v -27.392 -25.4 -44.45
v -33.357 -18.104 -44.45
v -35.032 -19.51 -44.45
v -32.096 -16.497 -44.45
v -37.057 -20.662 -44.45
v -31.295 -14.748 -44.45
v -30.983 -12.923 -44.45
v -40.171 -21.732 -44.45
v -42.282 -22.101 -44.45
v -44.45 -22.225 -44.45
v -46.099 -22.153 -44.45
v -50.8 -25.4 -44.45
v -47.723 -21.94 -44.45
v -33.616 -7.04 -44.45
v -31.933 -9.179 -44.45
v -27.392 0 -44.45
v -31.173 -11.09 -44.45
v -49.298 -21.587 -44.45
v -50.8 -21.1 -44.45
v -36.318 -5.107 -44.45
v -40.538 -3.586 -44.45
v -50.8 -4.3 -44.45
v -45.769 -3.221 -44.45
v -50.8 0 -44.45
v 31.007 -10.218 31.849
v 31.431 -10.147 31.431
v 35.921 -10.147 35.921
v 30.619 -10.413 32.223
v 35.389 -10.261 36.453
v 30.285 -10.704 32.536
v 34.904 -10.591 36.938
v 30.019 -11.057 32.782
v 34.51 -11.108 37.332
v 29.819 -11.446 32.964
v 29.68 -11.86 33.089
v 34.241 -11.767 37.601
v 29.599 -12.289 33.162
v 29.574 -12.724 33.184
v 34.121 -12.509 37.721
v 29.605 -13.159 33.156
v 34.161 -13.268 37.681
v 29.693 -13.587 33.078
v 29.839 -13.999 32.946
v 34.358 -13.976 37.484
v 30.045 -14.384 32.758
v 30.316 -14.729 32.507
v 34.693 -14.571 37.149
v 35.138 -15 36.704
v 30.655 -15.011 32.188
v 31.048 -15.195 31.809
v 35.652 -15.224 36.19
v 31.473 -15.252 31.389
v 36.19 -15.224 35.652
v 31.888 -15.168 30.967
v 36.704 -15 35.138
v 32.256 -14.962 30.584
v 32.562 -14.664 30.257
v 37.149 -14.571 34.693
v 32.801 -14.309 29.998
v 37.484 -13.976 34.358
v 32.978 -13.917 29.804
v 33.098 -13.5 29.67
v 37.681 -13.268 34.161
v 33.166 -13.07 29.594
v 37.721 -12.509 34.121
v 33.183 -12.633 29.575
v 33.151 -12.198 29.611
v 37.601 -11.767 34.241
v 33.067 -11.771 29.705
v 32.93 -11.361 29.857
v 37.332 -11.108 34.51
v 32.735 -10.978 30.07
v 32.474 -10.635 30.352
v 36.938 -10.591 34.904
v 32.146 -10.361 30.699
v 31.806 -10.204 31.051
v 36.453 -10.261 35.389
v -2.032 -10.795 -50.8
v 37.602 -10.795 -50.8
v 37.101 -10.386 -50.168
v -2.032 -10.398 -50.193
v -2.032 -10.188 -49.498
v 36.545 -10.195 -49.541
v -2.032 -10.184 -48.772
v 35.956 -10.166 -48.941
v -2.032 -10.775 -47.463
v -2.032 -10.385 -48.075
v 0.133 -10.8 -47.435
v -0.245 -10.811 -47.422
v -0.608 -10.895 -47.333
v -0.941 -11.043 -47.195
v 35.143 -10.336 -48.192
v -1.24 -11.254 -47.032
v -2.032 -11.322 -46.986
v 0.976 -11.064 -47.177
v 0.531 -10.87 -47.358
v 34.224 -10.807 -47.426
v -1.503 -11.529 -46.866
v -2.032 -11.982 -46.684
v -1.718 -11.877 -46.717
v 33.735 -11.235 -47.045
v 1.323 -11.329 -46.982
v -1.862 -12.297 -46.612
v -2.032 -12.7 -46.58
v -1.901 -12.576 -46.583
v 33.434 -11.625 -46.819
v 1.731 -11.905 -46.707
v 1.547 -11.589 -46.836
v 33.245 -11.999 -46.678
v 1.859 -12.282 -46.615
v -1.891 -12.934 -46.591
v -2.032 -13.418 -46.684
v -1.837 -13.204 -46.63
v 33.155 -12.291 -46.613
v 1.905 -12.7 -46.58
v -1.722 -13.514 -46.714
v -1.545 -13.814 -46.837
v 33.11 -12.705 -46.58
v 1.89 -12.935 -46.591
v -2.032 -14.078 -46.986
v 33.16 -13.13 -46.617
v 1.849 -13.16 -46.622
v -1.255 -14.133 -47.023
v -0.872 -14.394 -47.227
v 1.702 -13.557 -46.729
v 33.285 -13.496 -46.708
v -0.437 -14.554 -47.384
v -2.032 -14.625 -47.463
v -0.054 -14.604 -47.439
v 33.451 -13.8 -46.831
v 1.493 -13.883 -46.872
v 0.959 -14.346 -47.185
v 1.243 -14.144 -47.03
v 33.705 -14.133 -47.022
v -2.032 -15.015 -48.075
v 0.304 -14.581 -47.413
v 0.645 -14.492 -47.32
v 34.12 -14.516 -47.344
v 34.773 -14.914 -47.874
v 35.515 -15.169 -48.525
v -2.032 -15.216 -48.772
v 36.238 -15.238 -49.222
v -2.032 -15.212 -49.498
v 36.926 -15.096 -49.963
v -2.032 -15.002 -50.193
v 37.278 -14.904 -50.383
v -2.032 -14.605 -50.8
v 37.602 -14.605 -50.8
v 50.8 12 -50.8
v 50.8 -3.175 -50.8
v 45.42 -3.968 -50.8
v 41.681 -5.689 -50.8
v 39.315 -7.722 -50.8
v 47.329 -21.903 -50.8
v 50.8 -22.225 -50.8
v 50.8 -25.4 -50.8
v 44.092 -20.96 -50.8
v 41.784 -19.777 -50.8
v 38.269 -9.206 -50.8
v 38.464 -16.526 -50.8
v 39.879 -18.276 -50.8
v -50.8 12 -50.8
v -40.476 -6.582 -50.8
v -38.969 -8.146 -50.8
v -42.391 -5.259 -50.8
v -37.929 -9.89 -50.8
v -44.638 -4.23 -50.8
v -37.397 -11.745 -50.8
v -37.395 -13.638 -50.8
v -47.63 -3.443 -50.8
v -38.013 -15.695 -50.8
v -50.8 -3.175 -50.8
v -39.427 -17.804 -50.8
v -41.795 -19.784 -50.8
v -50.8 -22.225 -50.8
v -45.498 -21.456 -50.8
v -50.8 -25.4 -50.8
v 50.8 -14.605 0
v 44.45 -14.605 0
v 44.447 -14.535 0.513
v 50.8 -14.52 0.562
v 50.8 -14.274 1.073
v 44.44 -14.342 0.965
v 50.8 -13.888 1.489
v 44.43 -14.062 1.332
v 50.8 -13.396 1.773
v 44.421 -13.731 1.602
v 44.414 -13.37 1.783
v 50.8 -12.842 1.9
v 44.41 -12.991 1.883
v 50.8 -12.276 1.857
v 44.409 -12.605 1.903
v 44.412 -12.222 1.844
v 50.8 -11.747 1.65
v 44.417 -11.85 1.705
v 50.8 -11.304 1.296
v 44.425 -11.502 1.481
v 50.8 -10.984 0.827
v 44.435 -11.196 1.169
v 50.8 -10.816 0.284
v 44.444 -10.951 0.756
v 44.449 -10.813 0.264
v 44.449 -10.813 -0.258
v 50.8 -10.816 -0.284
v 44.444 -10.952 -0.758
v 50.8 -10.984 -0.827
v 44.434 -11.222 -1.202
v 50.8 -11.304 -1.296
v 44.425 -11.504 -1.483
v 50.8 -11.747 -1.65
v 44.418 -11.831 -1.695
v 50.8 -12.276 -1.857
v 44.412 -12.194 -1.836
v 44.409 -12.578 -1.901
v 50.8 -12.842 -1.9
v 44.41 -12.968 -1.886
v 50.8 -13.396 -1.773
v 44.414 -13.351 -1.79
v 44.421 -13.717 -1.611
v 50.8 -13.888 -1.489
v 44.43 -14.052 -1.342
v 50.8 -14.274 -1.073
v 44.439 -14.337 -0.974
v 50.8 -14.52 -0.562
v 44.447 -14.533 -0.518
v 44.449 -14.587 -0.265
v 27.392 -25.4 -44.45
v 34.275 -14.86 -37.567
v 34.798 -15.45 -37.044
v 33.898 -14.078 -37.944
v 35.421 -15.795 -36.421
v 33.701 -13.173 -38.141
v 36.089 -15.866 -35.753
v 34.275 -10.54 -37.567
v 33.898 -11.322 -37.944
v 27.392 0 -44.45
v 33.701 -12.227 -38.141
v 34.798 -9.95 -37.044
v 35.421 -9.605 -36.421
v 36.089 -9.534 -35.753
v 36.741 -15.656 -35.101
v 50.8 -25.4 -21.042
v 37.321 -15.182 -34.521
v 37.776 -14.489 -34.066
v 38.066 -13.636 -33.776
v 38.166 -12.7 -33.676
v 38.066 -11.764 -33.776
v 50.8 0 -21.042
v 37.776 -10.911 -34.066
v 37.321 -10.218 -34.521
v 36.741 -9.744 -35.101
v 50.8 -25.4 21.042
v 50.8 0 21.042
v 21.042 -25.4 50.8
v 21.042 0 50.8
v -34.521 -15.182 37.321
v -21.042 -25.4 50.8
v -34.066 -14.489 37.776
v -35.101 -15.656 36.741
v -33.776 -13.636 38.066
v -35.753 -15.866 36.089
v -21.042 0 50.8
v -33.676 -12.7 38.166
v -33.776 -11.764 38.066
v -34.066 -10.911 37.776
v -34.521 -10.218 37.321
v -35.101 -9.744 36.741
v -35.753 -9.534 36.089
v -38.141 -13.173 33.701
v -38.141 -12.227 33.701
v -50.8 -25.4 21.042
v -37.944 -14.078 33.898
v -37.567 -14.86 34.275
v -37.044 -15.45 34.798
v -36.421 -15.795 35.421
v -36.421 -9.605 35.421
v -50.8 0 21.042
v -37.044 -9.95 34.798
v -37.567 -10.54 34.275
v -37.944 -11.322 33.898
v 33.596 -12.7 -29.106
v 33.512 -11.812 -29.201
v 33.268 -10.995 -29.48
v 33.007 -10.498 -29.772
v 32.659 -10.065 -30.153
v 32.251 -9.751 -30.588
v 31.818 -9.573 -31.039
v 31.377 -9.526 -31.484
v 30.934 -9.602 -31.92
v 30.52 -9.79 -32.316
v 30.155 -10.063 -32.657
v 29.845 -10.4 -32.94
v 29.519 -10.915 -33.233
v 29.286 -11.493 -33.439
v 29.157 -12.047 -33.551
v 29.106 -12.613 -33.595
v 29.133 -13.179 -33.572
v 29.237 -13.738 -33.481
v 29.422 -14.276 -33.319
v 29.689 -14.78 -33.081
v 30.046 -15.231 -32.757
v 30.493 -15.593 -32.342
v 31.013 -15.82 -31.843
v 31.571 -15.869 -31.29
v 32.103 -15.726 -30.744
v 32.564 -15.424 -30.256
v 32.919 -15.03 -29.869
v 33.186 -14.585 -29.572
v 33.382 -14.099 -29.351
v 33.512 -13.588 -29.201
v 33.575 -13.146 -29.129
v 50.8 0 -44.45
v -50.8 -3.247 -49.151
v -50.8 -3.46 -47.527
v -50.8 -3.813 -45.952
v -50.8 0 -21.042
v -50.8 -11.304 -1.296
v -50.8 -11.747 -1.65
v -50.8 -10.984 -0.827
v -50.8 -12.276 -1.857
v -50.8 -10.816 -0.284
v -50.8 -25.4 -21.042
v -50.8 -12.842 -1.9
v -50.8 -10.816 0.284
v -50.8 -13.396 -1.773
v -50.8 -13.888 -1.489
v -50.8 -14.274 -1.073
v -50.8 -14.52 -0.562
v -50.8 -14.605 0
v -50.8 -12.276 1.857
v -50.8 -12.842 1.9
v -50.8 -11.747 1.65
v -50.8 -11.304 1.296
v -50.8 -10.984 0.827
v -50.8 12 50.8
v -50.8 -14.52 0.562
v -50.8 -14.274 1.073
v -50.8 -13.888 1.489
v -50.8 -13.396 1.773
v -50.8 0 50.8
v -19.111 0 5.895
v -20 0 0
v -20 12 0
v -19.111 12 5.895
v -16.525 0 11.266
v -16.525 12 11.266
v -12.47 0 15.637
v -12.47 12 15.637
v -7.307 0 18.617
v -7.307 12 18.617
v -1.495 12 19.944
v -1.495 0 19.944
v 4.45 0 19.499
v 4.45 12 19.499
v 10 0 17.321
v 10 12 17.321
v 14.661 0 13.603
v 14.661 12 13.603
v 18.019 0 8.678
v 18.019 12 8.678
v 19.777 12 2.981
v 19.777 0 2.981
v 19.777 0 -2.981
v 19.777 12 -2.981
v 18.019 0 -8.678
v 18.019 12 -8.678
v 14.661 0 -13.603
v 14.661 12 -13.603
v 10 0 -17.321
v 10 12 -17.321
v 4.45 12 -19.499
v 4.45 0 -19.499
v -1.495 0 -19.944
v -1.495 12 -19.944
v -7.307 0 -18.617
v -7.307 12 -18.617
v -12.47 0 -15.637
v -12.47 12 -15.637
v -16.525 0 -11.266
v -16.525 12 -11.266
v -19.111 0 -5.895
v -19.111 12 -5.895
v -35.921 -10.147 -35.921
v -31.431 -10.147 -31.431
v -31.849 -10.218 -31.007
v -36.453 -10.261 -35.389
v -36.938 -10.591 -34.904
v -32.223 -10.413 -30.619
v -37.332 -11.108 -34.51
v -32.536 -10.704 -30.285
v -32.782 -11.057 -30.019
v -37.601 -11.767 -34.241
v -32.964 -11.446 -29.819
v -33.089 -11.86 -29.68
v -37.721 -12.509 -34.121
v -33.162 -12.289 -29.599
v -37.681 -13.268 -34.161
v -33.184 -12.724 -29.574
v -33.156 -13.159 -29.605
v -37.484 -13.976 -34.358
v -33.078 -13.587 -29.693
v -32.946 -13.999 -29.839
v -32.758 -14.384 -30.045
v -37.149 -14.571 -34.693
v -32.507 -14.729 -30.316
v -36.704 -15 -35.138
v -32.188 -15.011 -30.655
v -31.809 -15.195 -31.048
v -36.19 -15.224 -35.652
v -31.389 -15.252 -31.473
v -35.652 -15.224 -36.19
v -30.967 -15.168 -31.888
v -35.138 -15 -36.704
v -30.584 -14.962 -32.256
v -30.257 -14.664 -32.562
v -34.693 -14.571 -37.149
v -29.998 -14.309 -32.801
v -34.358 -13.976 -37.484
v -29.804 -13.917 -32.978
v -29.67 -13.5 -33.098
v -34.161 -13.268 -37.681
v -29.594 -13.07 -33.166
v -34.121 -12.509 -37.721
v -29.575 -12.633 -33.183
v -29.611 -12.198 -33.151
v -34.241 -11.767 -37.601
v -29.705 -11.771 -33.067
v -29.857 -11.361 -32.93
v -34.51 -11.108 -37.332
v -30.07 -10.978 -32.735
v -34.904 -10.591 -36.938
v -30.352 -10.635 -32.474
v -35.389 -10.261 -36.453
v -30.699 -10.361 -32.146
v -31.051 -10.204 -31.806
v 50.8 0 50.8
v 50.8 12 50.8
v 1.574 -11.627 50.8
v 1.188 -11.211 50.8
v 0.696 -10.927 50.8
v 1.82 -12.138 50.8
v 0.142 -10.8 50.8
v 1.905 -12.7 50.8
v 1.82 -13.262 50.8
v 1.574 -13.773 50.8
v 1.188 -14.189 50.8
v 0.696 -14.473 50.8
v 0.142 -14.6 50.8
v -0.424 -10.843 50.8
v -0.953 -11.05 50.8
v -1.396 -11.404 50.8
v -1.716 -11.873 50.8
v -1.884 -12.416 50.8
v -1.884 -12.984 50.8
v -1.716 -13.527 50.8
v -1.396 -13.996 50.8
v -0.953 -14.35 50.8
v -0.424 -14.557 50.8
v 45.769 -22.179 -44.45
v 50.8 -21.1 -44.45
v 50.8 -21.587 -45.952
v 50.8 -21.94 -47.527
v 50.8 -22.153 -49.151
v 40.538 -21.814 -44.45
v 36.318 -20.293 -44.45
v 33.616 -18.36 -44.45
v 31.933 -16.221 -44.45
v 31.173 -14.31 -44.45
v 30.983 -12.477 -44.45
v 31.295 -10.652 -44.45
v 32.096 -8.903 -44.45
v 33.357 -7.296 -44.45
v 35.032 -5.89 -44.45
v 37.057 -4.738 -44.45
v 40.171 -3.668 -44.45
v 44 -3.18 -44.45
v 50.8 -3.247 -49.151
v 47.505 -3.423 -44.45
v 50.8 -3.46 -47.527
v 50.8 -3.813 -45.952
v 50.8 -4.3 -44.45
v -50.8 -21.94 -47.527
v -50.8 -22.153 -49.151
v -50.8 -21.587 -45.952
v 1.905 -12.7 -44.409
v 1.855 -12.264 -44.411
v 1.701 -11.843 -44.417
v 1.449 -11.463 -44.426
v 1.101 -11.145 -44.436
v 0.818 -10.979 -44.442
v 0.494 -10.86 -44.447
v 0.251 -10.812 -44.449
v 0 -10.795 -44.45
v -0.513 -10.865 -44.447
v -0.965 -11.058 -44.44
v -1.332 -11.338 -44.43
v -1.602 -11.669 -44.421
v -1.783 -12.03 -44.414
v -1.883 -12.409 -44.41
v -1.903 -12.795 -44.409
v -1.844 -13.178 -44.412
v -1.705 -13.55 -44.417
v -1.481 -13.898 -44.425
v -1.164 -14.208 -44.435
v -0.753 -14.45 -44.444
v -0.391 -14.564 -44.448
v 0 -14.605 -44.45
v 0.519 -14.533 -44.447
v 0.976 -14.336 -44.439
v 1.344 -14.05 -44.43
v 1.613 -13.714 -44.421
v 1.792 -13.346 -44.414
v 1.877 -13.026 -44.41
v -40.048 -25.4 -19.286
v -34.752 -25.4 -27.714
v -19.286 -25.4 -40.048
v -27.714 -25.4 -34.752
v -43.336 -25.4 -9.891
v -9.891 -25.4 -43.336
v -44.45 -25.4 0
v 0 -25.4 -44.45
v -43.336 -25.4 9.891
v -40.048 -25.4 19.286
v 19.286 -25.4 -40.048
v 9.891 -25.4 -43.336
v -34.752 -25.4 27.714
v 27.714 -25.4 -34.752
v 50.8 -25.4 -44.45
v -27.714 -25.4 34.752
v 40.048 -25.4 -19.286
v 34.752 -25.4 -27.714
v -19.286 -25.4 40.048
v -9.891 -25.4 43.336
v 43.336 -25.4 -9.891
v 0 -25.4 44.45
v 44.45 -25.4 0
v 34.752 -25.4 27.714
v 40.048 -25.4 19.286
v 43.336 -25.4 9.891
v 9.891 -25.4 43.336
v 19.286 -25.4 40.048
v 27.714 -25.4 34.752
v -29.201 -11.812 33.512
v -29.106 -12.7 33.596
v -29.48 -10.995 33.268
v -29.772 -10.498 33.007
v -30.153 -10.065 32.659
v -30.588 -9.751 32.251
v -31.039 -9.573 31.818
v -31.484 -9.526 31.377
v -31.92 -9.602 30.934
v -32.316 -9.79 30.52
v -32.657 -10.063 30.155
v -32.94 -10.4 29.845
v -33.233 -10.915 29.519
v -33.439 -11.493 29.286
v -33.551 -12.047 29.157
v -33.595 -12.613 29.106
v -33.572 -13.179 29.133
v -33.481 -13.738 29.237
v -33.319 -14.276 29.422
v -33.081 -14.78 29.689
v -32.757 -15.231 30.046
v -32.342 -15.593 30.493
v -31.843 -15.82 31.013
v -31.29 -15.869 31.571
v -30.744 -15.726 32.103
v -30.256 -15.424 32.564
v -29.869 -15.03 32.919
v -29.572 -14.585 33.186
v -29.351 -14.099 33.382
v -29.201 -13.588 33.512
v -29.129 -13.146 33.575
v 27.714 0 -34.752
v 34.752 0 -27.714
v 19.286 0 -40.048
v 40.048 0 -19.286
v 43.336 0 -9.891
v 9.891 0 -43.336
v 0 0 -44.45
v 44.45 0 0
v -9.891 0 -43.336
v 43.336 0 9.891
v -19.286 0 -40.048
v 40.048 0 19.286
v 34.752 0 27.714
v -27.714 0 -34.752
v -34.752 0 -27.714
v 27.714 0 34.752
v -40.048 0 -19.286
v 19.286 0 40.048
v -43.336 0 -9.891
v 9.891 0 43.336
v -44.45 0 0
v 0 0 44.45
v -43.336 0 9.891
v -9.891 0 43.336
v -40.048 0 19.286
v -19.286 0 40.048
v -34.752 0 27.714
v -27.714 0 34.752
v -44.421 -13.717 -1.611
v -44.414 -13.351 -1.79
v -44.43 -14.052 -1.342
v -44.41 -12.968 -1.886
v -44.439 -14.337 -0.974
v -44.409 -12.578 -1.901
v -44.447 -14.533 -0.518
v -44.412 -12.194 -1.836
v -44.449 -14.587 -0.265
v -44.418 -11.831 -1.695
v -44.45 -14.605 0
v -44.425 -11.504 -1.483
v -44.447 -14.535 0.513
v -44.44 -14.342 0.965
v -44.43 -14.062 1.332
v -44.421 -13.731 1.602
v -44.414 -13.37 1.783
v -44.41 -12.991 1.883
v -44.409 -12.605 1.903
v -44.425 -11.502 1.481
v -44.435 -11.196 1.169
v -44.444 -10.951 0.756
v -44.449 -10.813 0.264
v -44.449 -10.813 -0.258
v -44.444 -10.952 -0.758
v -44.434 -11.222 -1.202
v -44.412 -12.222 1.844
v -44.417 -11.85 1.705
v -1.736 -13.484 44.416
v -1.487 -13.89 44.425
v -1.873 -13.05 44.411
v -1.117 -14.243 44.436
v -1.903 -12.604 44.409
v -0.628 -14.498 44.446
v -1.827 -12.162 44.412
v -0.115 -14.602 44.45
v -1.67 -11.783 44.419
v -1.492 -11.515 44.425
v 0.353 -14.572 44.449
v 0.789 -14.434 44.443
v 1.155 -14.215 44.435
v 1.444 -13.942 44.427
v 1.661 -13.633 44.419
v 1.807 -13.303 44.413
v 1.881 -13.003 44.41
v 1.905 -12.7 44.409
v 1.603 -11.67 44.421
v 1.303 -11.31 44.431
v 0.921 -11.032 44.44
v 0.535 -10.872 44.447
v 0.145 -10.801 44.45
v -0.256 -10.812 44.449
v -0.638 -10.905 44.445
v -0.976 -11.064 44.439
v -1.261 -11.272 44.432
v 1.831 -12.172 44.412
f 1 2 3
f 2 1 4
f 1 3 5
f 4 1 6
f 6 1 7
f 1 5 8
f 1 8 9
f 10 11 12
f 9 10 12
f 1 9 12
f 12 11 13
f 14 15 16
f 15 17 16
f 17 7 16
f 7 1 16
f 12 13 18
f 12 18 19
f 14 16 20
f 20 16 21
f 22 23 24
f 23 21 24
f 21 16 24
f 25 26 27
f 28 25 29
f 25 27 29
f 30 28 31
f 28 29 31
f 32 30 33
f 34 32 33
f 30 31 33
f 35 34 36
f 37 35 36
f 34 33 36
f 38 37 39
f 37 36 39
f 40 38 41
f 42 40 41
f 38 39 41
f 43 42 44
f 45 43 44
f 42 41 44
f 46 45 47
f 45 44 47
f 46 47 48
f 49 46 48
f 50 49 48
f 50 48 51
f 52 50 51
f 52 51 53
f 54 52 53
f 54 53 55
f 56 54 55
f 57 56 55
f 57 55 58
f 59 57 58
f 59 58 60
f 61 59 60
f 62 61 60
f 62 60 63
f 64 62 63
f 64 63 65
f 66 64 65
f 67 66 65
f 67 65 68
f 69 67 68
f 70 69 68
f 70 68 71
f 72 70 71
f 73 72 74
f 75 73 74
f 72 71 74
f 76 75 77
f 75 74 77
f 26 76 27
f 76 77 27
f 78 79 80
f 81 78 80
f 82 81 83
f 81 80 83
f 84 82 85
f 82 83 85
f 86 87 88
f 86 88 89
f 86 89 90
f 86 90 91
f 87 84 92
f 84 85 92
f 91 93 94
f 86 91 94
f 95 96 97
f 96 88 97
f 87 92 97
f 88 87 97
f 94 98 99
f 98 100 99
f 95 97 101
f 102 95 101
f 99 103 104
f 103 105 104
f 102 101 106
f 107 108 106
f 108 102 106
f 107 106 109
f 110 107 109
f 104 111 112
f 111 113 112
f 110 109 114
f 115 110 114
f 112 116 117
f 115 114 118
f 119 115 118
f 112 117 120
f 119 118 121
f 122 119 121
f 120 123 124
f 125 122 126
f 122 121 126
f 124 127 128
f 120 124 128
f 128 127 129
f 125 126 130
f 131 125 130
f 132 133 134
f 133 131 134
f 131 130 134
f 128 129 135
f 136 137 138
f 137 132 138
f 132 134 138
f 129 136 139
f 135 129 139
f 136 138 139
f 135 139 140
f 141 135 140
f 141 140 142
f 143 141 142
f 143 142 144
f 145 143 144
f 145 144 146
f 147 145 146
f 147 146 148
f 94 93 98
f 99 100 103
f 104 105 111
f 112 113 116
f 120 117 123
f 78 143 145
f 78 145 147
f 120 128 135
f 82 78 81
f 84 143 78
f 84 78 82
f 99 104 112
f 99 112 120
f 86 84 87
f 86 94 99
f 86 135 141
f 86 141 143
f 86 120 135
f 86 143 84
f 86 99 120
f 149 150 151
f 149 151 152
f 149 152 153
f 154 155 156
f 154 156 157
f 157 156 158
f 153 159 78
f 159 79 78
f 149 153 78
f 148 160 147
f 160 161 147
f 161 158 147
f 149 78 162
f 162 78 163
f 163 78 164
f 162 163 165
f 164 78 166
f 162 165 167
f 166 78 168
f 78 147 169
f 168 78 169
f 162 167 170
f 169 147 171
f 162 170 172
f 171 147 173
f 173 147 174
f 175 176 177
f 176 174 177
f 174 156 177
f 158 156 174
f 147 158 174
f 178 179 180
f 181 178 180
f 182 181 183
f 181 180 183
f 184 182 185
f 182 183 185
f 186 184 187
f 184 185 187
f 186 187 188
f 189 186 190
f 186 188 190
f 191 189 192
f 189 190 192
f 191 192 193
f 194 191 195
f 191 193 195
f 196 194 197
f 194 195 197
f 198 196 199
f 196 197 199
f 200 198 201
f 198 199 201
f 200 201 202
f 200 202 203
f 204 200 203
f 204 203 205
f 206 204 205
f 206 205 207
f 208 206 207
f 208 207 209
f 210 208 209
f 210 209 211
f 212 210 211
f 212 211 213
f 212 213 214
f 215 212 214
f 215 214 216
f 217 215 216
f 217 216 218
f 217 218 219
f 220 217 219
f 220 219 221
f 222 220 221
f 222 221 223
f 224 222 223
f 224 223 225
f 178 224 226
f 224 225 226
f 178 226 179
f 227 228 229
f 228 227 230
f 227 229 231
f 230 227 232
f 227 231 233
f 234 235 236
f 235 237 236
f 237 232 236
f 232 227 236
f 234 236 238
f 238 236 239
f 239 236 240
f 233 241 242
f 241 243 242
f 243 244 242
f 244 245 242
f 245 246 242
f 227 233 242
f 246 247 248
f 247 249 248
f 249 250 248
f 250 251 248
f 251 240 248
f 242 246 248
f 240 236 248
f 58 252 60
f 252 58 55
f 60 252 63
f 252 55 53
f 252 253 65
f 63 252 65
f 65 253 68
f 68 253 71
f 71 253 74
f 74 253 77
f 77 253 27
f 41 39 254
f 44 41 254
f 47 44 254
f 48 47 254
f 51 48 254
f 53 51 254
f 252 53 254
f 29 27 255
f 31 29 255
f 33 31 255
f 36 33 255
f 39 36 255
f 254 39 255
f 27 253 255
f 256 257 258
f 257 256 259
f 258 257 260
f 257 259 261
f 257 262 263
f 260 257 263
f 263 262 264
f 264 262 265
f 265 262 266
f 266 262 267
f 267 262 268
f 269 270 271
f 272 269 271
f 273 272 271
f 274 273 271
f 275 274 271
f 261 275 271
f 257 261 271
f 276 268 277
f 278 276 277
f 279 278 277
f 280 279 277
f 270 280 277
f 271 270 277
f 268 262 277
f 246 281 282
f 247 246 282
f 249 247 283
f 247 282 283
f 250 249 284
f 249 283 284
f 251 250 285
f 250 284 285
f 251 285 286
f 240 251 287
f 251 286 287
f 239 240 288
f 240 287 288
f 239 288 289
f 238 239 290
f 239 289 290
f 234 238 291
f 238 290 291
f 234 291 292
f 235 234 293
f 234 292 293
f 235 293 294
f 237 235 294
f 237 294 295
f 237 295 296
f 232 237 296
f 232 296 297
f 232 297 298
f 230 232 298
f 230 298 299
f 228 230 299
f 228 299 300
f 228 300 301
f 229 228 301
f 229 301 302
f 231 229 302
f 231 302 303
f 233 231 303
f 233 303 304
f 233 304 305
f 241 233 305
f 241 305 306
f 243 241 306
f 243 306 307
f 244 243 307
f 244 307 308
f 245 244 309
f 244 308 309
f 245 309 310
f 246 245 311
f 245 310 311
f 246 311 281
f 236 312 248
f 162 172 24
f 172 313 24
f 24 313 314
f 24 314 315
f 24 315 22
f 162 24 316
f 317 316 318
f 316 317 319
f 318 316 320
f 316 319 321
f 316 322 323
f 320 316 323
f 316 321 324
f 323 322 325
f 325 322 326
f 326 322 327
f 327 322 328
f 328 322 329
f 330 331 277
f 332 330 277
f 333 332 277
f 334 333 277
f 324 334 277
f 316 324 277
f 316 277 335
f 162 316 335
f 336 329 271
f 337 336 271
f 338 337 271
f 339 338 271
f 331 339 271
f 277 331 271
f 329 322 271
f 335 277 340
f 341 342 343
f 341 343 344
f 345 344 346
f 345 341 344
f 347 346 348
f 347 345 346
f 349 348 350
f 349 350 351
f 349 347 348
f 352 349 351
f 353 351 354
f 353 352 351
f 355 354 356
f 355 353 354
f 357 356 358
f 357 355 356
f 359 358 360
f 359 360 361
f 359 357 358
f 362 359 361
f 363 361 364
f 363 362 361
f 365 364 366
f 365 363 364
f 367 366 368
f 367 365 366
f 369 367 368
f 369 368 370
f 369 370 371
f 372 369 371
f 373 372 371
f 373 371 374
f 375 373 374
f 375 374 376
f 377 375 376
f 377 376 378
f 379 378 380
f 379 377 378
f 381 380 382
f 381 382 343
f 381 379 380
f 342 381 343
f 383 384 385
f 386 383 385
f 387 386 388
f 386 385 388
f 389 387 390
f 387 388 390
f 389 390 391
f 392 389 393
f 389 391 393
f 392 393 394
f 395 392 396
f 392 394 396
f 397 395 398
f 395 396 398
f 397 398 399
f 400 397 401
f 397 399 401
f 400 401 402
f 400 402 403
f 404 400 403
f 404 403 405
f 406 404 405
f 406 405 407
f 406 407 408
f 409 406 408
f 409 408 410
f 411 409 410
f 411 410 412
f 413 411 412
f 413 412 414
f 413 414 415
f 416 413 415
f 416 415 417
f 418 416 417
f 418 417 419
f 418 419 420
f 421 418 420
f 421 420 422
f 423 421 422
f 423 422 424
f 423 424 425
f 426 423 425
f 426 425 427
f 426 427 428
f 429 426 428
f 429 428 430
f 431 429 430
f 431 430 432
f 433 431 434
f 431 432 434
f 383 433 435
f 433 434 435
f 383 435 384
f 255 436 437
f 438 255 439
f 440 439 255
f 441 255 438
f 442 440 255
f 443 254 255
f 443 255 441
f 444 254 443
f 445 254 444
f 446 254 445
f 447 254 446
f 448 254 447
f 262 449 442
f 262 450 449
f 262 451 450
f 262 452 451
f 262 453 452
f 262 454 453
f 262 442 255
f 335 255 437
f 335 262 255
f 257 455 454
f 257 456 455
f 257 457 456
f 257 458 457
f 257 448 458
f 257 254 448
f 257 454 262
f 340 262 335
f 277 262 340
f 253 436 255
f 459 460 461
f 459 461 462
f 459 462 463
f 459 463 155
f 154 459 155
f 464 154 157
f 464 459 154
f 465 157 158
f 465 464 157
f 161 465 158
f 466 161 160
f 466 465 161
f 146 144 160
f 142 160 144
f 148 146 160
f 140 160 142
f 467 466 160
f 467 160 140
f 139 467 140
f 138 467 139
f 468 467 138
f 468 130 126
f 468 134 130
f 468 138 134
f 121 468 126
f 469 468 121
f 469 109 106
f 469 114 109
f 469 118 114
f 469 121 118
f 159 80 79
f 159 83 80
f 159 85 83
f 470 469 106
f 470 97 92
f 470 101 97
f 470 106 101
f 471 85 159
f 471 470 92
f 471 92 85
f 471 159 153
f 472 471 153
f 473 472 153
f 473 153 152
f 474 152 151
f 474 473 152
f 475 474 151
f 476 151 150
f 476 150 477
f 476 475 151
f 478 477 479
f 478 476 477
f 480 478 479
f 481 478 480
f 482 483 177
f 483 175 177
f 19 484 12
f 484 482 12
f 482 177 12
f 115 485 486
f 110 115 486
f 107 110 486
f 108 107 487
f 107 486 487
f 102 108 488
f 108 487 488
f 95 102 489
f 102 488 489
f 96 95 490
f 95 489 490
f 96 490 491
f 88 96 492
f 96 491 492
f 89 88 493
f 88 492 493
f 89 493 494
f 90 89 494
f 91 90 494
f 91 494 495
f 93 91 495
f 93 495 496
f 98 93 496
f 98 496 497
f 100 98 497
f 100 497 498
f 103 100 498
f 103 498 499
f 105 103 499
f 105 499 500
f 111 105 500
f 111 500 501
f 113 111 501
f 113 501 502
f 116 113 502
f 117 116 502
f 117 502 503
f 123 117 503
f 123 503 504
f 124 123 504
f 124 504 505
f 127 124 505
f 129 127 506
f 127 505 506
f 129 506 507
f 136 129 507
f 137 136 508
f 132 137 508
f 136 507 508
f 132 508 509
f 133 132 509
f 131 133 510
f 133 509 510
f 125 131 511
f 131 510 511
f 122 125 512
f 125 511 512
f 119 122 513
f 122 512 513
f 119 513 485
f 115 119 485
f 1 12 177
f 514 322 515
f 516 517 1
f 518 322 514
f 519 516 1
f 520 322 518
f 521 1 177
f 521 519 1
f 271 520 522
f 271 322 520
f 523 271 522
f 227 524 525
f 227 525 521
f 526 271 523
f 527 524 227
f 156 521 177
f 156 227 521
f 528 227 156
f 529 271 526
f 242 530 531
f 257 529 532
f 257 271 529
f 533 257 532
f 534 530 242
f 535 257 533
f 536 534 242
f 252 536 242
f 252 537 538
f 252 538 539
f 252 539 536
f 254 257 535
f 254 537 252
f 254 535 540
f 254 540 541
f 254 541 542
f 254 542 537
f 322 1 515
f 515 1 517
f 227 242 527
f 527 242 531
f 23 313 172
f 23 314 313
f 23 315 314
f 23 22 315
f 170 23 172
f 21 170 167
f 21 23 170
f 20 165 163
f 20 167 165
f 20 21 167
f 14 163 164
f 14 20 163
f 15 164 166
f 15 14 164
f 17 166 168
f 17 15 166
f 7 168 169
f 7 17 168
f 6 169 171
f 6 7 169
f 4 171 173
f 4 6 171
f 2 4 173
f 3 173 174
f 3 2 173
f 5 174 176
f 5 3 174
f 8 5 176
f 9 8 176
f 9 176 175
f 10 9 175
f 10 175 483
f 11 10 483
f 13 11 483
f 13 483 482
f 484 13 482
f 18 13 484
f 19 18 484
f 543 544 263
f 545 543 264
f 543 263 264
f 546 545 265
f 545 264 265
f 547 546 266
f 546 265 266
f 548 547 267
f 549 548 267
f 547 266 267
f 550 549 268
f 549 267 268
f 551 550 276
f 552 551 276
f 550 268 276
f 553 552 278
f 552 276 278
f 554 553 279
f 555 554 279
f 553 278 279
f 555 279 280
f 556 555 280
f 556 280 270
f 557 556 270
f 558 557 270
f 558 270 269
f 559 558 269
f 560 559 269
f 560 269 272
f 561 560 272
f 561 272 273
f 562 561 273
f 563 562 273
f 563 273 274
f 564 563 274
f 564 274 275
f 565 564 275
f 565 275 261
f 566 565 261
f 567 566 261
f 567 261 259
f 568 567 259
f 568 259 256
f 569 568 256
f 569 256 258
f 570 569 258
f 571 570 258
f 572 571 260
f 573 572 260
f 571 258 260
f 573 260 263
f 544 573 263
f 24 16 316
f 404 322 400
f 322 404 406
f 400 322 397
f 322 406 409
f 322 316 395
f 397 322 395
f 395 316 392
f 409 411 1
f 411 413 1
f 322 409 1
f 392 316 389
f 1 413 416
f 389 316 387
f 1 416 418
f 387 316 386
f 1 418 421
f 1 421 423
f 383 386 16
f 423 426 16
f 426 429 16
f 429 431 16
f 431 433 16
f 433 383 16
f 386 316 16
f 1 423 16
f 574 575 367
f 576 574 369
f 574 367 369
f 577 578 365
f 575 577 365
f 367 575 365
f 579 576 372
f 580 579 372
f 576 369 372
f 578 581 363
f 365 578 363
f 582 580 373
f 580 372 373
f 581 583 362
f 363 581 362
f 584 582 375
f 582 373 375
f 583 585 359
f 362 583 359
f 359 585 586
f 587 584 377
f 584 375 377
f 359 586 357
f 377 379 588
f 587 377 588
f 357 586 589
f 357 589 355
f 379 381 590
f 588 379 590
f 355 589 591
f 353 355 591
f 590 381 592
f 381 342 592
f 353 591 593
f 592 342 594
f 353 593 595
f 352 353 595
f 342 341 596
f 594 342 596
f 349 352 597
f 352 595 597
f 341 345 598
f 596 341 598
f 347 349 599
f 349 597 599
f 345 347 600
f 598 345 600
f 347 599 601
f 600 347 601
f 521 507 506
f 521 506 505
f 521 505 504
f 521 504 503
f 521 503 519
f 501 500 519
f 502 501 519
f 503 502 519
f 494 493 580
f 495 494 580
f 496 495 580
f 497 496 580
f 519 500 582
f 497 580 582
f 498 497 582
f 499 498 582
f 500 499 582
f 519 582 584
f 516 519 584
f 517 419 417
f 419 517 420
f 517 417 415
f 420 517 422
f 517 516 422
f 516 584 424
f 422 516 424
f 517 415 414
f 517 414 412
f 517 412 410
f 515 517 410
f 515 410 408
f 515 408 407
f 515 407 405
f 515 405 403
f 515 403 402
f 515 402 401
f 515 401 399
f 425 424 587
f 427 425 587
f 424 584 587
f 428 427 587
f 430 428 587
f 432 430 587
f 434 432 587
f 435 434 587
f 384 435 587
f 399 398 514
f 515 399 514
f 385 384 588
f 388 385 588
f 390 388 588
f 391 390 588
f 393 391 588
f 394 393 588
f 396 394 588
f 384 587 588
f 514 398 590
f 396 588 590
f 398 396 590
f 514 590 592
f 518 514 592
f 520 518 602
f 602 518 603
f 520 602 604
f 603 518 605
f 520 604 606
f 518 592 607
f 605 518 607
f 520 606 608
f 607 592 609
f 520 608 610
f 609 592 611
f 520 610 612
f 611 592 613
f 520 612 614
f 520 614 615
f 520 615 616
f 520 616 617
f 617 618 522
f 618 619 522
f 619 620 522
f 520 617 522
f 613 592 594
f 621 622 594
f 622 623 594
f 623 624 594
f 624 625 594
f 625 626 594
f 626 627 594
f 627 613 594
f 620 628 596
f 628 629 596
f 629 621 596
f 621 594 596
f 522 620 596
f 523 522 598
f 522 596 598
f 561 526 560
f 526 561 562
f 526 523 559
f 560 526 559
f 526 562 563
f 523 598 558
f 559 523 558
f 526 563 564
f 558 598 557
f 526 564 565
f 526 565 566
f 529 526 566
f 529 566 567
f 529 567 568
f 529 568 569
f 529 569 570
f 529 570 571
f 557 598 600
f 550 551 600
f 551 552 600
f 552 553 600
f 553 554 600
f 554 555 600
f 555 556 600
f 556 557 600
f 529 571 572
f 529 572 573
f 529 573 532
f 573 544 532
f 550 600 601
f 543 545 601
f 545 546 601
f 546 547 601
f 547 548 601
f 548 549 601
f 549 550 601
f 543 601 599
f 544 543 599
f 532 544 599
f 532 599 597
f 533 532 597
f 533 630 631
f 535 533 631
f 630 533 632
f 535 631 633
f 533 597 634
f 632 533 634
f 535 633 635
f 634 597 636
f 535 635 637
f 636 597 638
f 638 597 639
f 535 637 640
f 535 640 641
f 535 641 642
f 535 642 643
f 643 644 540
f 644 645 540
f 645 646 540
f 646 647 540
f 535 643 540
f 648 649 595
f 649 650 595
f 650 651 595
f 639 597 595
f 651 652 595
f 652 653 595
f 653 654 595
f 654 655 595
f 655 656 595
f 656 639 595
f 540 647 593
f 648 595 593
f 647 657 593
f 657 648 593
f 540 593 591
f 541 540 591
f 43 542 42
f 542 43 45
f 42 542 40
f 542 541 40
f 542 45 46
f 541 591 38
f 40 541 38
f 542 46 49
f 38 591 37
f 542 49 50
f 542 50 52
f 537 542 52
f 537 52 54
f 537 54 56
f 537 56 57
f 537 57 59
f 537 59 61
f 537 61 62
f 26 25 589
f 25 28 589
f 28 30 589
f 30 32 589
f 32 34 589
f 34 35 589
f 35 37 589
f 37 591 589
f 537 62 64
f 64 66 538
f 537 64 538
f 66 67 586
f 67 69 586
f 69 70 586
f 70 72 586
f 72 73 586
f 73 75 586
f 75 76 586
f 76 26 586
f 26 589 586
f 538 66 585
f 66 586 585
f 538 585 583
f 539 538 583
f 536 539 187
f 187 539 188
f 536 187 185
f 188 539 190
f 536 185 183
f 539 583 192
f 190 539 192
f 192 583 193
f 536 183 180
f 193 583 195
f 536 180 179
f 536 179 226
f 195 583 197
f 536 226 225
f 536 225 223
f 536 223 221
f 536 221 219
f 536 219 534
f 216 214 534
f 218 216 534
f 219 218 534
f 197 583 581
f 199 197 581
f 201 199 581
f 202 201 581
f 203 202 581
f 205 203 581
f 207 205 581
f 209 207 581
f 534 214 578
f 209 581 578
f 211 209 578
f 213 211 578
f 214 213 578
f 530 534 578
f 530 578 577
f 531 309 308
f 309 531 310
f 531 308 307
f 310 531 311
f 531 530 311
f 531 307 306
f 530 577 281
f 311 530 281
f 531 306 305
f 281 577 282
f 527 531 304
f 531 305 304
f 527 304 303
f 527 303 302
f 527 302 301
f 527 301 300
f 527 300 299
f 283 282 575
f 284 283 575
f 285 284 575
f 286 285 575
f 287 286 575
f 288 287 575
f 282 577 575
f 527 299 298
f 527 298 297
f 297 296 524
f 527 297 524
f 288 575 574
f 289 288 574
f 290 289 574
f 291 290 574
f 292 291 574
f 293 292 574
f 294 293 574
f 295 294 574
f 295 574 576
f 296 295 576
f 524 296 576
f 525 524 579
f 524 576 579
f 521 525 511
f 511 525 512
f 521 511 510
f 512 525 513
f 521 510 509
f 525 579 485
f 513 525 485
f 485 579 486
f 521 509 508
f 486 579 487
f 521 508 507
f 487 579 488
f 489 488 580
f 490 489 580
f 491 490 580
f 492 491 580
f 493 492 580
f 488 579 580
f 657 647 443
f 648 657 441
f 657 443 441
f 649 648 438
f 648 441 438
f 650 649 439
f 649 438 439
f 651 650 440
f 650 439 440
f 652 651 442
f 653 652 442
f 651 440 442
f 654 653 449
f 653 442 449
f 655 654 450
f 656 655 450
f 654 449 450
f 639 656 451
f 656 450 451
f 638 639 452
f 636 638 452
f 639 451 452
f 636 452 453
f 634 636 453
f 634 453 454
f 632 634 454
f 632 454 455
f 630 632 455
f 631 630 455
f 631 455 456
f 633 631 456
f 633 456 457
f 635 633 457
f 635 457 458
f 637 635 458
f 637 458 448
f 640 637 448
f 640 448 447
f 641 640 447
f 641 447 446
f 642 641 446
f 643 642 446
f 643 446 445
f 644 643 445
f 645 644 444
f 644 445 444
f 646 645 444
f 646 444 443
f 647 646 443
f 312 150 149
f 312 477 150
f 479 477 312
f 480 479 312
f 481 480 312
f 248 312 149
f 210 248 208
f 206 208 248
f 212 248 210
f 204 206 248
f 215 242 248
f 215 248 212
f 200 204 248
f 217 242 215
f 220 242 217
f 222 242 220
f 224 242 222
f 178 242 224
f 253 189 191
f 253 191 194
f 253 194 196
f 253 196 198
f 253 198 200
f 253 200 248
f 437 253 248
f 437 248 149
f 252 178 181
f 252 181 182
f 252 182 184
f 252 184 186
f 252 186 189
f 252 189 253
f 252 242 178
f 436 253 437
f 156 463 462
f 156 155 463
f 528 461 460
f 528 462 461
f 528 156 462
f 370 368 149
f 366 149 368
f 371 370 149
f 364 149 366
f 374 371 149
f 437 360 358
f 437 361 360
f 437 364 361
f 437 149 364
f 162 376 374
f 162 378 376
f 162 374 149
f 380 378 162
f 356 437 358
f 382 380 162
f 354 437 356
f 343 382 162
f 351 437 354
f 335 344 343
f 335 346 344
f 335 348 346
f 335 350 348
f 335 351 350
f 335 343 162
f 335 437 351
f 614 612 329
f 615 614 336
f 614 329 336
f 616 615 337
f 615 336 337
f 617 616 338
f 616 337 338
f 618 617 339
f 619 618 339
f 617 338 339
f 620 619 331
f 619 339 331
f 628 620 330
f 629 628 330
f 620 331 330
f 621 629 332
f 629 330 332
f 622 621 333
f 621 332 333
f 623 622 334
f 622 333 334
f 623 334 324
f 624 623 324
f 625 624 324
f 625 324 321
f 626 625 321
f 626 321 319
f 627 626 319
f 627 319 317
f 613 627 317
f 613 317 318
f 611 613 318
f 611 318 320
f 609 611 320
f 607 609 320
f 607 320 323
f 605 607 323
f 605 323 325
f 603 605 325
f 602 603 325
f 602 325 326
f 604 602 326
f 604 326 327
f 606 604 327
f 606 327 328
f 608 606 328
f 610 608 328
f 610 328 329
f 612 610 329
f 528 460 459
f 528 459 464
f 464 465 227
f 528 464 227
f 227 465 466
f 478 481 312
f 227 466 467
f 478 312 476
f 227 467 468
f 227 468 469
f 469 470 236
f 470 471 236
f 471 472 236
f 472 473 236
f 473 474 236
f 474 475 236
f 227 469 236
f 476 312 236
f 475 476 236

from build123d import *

# Parameters (mm, degrees)
F1_DEPTH  = 25.4
F2_W      = 101.6
F2_H      = 101.6
F2_R      = 20
F3_DEPTH  = 12
F5_R      = 3.175
F6_DEPTH  = 101.6
F7_R      = 9.525
F8_DEPTH  = 31.5670489687
F9_R      = 9.525
F10_DEPTH = 31.5670489686
F11_R     = 1.905
F12_DEPTH = 101.6
F13_R     = 1.905
F14_DEPTH = 101.6
F17_DEPTH = 52.832
F4_R      = 2.5527
F18_DEPTH = 101.6


with BuildPart() as f1:
    # F0 (on Front) → F1 (new body)
    with BuildSketch(Plane.XZ):
        Polygon((-27.3920489686, -44.45), (1.258e-07, -44.45), (27.3920489686, -44.45), (50.8, -21.0420489686), (50.8, 21.0420489686), (21.0420489686, 50.8), (-21.0420489686, 50.8), (-50.8, 21.0420489686), (-50.8, -21.0420489686), align=None)
        with BuildLine():
            ThreePointArc((1.258e-07, -44.45), (-31.4308964682, 31.4308963793), (44.45, 0))
            ThreePointArc((44.45, 0), (31.4308964682, -31.4308963793), (1.258e-07, -44.45))
        make_face(mode=Mode.SUBTRACT)
        Polygon((27.3920489686, -44.45), (1.258e-07, -44.45), (-27.3920489686, -44.45), (-21.0420489686, -50.8), (21.0420489686, -50.8), align=None)
        Polygon((-21.0420489686, -50.8), (-27.3920489686, -44.45), (-50.8, -44.45), (-50.8, -50.8), align=None)
        Polygon((50.8, -44.45), (27.3920489686, -44.45), (21.0420489686, -50.8), (50.8, -50.8), align=None)
    extrude(amount=F1_DEPTH)

    # F2 (on face) → F3 (join)
    with BuildSketch(Plane(origin=(0, 0, 0), x_dir=(-1, 0, 0), z_dir=(0, 1, 0))):
        Rectangle(F2_W, F2_H)
        Circle(F2_R, mode=Mode.SUBTRACT)
    extrude(amount=F3_DEPTH)

    # F5 (on face) → F6 (cut, through all)
    with BuildSketch(Plane(origin=(-35.9210244843, 0, 35.9210244843), x_dir=(0.7071067812, 0, 0.7071067812), z_dir=(-0.7071067812, 0, 0.7071067812))):
        with Locations((0, -12.7)):
            Circle(F5_R)
    extrude(amount=-F6_DEPTH, mode=Mode.SUBTRACT)

    # F7 (on face) → F8 (cut, up to face)
    with BuildSketch(Plane(origin=(-35.9210244843, 0, -35.9210244843), x_dir=(0, -1, 0), z_dir=(-0.7071067812, 0, -0.7071067812))):
        with Locations((12.7, 2e-10)):
            Circle(F7_R)
    extrude(amount=F8_DEPTH, mode=Mode.SUBTRACT)

    # F9 (on face) → F10 (cut, up to face)
    with BuildSketch(Plane(origin=(35.9210244843, 0, -35.9210244843), x_dir=(0.7071067812, 0, 0.7071067812), z_dir=(0.7071067812, 0, -0.7071067812))):
        with Locations((0, 12.7)):
            Circle(F9_R)
    extrude(amount=F10_DEPTH, mode=Mode.SUBTRACT)

    # F11 (on face) → F12 (cut, through all)
    with BuildSketch(Plane.XY.offset(50.8)):
        with Locations((0, -12.7)):
            Circle(F11_R)
    extrude(amount=-F12_DEPTH, mode=Mode.SUBTRACT)

    # F13 (on face) → F14 (cut, through all)
    with BuildSketch(Plane(origin=(-50.8, 0, 0), x_dir=(0, -1, 0), z_dir=(-1, 0, 0))):
        with Locations((12.7, 0)):
            Circle(F13_R)
    extrude(amount=-F14_DEPTH, mode=Mode.SUBTRACT)

    # F16 (on face) → F17 (cut)
    with BuildSketch(Plane.YZ.offset(50.8)):
        with BuildLine():
            Line((-14.605, -50.8), (-10.795, -50.8))
            ThreePointArc((-10.795, -50.8), (-12.7, -46.5799479175), (-14.605, -50.8))
        make_face()
    extrude(amount=-F17_DEPTH, mode=Mode.SUBTRACT)

    # F4 (on face) → F18 (cut, through all)
    with BuildSketch(Plane(origin=(35.9210244843, 0, 35.9210244843), x_dir=(0, 1, 0), z_dir=(0.7071067812, 0, 0.7071067812))):
        with Locations((-12.7, 0)):
            Circle(F4_R)
    extrude(amount=-F18_DEPTH, mode=Mode.SUBTRACT)


solid = f1.part
